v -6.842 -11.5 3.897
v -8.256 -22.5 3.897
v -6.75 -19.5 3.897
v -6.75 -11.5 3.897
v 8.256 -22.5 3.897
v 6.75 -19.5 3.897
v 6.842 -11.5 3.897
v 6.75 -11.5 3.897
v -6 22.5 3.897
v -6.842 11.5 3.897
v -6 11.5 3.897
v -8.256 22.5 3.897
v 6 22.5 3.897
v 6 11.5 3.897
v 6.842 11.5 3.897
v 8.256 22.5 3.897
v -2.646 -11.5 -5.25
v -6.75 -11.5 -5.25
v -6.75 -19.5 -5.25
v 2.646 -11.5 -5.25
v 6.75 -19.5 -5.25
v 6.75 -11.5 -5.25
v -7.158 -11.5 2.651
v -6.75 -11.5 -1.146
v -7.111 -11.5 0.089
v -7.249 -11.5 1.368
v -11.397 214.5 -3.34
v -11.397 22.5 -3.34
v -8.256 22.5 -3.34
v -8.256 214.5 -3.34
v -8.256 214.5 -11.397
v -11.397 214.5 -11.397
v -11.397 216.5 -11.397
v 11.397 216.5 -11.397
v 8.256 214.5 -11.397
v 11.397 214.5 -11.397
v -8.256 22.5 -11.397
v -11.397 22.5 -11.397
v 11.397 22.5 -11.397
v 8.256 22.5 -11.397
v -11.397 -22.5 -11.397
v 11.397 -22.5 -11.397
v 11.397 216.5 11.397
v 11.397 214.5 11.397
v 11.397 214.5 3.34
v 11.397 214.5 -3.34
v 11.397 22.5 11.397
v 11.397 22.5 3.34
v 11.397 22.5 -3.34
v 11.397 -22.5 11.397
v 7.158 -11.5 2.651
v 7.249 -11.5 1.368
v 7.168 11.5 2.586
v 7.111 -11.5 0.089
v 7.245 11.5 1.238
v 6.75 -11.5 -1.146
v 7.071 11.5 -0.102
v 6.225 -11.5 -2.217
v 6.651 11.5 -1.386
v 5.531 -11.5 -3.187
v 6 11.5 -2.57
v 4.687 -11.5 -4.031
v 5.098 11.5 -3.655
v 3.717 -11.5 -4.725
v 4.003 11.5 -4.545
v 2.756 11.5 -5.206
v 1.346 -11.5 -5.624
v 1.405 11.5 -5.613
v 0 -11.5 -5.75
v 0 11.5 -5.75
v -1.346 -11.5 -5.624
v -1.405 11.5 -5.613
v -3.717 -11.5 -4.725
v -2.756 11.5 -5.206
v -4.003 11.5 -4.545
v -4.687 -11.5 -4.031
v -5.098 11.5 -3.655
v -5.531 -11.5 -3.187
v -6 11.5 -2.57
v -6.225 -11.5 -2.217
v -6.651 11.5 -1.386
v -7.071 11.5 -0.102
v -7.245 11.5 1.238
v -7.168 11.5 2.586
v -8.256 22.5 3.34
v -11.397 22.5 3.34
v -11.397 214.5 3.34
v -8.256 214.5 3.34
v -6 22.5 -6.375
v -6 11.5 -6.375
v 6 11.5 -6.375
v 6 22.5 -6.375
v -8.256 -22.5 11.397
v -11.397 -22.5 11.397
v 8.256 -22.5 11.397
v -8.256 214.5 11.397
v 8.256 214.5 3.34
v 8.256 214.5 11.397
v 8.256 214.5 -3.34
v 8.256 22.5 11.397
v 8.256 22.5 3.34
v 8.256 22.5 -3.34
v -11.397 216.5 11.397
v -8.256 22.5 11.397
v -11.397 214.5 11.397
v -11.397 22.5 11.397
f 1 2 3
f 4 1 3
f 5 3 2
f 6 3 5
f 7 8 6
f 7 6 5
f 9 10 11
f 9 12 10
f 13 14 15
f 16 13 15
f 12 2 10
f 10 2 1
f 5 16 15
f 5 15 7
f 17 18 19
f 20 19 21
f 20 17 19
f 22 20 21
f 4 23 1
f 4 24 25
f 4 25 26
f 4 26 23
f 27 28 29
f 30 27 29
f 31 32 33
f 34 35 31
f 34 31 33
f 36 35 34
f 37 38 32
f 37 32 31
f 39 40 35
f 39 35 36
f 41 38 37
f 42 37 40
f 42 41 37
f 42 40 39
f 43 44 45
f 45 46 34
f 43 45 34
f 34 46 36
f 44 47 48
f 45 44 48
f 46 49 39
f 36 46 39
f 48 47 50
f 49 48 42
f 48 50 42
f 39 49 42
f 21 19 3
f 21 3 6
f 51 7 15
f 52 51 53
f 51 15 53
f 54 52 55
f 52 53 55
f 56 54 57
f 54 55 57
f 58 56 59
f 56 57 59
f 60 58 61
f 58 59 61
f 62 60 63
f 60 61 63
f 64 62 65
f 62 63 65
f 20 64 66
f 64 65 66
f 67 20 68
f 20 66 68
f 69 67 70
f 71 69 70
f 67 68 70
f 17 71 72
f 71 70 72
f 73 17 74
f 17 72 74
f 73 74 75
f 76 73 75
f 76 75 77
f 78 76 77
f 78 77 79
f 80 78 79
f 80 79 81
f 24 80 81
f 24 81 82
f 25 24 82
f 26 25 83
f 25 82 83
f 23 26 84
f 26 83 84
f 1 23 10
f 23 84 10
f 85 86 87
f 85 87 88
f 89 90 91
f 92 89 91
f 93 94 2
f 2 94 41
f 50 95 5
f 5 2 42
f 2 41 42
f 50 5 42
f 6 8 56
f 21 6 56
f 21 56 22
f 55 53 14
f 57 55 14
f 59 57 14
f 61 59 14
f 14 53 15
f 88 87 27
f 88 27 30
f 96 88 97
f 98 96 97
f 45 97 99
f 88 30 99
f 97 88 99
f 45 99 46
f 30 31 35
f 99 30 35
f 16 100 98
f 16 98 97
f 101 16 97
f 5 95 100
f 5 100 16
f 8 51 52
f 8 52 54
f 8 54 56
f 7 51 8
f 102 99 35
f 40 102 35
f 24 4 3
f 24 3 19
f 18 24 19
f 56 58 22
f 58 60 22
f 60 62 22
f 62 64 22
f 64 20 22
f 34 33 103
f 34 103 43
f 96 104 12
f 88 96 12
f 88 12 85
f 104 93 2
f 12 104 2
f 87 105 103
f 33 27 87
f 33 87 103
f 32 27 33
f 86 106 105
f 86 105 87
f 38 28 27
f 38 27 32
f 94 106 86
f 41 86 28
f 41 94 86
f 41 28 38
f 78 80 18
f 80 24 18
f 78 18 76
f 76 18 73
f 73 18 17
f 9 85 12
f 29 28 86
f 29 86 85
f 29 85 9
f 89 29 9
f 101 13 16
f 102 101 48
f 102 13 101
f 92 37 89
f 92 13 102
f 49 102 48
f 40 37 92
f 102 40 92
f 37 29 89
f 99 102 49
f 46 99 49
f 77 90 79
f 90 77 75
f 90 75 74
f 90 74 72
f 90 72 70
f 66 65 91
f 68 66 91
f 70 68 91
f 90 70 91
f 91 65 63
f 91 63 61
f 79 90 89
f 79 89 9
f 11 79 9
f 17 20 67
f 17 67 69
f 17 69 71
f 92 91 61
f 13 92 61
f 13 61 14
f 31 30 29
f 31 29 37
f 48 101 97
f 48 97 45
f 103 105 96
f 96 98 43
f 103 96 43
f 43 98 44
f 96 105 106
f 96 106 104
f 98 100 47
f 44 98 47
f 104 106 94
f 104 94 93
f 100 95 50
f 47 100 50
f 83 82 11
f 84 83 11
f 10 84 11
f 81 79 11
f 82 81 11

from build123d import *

# Parameters (mm, degrees)
SKETCH1_W           = 22.794602658
SKETCH1_H           = 22.794602658
BOSS_EXTRUDE1_DEPTH = 22.5
SKETCH2_R           = 7.25
CUT_EXTRUDE1_DEPTH  = 11.5
SKETCH4_W           = 16.511455896
SKETCH4_H           = 45
CUT_EXTRUDE2_DEPTH  = 7.5
SKETCH6_W           = 3.141573381
SKETCH6_H           = 8.057746469
BOSS_EXTRUDE2_DEPTH = 192
SKETCH8_W           = 22.794602658
SKETCH8_H           = 22.794602658
BOSS_EXTRUDE3_DEPTH = 2
SKETCH10_W          = 12
SKETCH10_H          = 12.75
CUT_EXTRUDE4_DEPTH  = 11
SKETCH11_W          = 13.5
SKETCH11_H          = 13.5
CUT_EXTRUDE5_DEPTH  = 8


with BuildPart() as part:
    # Sketch1 → Boss-Extrude1 (new, symmetric)
    with BuildSketch(Plane(origin=(0, 0, 0), x_dir=(1, 0, 0), z_dir=(0, 1, 0))):
        Rectangle(SKETCH1_W, SKETCH1_H)
    extrude(amount=BOSS_EXTRUDE1_DEPTH, both=True)

    # Sketch2 → Cut-Extrude1 (cut, symmetric)
    with BuildSketch(Plane(origin=(0, 0, 0), x_dir=(1, 0, 0), z_dir=(0, 1, 0))):
        with Locations(Location((0, -1.5, 0), (0, 0, 270))):
            Circle(SKETCH2_R)
    extrude(amount=CUT_EXTRUDE1_DEPTH, both=True, mode=Mode.SUBTRACT)

    # Sketch4 → Cut-Extrude2 (cut, symmetric)
    with BuildSketch(Plane.XY.offset(11.397301329)):
        Rectangle(SKETCH4_W, SKETCH4_H)
    extrude(amount=CUT_EXTRUDE2_DEPTH, both=True, mode=Mode.SUBTRACT)

    # Sketch6 → Boss-Extrude2 (add)
    with BuildSketch(Plane(origin=(0, 22.5, 0), x_dir=(1, 0, 0), z_dir=(0, 1, 0))):
        with Locations((-9.826514639, 7.368428095)):
            Rectangle(SKETCH6_W, SKETCH6_H)
        with Locations((9.826514639, 7.368428095)):
            Rectangle(SKETCH6_W, SKETCH6_H)
        with Locations((-9.826514639, -7.368428095)):
            Rectangle(SKETCH6_W, SKETCH6_H)
        with Locations((9.826514639, -7.368428095)):
            Rectangle(SKETCH6_W, SKETCH6_H)
    extrude(amount=BOSS_EXTRUDE2_DEPTH)

    # Sketch8 → Boss-Extrude3 (add)
    with BuildSketch(Plane(origin=(0, 214.5, 0), x_dir=(1, 0, 0), z_dir=(0, 1, 0))):
        Rectangle(SKETCH8_W, SKETCH8_H)
    extrude(amount=BOSS_EXTRUDE3_DEPTH)

    # Sketch10 → Cut-Extrude4 (cut)
    with BuildSketch(Plane.XZ.offset(-11.5)):
        Rectangle(SKETCH10_W, SKETCH10_H)
    extrude(amount=-CUT_EXTRUDE4_DEPTH, mode=Mode.SUBTRACT)

    # Sketch11 → Cut-Extrude5 (cut)
    with BuildSketch(Plane(origin=(0, -11.5, 0), x_dir=(1, 0, 0), z_dir=(0, 1, 0))):
        with Locations((0, -1.5)):
            Rectangle(SKETCH11_W, SKETCH11_H)
    extrude(amount=-CUT_EXTRUDE5_DEPTH, mode=Mode.SUBTRACT)


solid = part.part
